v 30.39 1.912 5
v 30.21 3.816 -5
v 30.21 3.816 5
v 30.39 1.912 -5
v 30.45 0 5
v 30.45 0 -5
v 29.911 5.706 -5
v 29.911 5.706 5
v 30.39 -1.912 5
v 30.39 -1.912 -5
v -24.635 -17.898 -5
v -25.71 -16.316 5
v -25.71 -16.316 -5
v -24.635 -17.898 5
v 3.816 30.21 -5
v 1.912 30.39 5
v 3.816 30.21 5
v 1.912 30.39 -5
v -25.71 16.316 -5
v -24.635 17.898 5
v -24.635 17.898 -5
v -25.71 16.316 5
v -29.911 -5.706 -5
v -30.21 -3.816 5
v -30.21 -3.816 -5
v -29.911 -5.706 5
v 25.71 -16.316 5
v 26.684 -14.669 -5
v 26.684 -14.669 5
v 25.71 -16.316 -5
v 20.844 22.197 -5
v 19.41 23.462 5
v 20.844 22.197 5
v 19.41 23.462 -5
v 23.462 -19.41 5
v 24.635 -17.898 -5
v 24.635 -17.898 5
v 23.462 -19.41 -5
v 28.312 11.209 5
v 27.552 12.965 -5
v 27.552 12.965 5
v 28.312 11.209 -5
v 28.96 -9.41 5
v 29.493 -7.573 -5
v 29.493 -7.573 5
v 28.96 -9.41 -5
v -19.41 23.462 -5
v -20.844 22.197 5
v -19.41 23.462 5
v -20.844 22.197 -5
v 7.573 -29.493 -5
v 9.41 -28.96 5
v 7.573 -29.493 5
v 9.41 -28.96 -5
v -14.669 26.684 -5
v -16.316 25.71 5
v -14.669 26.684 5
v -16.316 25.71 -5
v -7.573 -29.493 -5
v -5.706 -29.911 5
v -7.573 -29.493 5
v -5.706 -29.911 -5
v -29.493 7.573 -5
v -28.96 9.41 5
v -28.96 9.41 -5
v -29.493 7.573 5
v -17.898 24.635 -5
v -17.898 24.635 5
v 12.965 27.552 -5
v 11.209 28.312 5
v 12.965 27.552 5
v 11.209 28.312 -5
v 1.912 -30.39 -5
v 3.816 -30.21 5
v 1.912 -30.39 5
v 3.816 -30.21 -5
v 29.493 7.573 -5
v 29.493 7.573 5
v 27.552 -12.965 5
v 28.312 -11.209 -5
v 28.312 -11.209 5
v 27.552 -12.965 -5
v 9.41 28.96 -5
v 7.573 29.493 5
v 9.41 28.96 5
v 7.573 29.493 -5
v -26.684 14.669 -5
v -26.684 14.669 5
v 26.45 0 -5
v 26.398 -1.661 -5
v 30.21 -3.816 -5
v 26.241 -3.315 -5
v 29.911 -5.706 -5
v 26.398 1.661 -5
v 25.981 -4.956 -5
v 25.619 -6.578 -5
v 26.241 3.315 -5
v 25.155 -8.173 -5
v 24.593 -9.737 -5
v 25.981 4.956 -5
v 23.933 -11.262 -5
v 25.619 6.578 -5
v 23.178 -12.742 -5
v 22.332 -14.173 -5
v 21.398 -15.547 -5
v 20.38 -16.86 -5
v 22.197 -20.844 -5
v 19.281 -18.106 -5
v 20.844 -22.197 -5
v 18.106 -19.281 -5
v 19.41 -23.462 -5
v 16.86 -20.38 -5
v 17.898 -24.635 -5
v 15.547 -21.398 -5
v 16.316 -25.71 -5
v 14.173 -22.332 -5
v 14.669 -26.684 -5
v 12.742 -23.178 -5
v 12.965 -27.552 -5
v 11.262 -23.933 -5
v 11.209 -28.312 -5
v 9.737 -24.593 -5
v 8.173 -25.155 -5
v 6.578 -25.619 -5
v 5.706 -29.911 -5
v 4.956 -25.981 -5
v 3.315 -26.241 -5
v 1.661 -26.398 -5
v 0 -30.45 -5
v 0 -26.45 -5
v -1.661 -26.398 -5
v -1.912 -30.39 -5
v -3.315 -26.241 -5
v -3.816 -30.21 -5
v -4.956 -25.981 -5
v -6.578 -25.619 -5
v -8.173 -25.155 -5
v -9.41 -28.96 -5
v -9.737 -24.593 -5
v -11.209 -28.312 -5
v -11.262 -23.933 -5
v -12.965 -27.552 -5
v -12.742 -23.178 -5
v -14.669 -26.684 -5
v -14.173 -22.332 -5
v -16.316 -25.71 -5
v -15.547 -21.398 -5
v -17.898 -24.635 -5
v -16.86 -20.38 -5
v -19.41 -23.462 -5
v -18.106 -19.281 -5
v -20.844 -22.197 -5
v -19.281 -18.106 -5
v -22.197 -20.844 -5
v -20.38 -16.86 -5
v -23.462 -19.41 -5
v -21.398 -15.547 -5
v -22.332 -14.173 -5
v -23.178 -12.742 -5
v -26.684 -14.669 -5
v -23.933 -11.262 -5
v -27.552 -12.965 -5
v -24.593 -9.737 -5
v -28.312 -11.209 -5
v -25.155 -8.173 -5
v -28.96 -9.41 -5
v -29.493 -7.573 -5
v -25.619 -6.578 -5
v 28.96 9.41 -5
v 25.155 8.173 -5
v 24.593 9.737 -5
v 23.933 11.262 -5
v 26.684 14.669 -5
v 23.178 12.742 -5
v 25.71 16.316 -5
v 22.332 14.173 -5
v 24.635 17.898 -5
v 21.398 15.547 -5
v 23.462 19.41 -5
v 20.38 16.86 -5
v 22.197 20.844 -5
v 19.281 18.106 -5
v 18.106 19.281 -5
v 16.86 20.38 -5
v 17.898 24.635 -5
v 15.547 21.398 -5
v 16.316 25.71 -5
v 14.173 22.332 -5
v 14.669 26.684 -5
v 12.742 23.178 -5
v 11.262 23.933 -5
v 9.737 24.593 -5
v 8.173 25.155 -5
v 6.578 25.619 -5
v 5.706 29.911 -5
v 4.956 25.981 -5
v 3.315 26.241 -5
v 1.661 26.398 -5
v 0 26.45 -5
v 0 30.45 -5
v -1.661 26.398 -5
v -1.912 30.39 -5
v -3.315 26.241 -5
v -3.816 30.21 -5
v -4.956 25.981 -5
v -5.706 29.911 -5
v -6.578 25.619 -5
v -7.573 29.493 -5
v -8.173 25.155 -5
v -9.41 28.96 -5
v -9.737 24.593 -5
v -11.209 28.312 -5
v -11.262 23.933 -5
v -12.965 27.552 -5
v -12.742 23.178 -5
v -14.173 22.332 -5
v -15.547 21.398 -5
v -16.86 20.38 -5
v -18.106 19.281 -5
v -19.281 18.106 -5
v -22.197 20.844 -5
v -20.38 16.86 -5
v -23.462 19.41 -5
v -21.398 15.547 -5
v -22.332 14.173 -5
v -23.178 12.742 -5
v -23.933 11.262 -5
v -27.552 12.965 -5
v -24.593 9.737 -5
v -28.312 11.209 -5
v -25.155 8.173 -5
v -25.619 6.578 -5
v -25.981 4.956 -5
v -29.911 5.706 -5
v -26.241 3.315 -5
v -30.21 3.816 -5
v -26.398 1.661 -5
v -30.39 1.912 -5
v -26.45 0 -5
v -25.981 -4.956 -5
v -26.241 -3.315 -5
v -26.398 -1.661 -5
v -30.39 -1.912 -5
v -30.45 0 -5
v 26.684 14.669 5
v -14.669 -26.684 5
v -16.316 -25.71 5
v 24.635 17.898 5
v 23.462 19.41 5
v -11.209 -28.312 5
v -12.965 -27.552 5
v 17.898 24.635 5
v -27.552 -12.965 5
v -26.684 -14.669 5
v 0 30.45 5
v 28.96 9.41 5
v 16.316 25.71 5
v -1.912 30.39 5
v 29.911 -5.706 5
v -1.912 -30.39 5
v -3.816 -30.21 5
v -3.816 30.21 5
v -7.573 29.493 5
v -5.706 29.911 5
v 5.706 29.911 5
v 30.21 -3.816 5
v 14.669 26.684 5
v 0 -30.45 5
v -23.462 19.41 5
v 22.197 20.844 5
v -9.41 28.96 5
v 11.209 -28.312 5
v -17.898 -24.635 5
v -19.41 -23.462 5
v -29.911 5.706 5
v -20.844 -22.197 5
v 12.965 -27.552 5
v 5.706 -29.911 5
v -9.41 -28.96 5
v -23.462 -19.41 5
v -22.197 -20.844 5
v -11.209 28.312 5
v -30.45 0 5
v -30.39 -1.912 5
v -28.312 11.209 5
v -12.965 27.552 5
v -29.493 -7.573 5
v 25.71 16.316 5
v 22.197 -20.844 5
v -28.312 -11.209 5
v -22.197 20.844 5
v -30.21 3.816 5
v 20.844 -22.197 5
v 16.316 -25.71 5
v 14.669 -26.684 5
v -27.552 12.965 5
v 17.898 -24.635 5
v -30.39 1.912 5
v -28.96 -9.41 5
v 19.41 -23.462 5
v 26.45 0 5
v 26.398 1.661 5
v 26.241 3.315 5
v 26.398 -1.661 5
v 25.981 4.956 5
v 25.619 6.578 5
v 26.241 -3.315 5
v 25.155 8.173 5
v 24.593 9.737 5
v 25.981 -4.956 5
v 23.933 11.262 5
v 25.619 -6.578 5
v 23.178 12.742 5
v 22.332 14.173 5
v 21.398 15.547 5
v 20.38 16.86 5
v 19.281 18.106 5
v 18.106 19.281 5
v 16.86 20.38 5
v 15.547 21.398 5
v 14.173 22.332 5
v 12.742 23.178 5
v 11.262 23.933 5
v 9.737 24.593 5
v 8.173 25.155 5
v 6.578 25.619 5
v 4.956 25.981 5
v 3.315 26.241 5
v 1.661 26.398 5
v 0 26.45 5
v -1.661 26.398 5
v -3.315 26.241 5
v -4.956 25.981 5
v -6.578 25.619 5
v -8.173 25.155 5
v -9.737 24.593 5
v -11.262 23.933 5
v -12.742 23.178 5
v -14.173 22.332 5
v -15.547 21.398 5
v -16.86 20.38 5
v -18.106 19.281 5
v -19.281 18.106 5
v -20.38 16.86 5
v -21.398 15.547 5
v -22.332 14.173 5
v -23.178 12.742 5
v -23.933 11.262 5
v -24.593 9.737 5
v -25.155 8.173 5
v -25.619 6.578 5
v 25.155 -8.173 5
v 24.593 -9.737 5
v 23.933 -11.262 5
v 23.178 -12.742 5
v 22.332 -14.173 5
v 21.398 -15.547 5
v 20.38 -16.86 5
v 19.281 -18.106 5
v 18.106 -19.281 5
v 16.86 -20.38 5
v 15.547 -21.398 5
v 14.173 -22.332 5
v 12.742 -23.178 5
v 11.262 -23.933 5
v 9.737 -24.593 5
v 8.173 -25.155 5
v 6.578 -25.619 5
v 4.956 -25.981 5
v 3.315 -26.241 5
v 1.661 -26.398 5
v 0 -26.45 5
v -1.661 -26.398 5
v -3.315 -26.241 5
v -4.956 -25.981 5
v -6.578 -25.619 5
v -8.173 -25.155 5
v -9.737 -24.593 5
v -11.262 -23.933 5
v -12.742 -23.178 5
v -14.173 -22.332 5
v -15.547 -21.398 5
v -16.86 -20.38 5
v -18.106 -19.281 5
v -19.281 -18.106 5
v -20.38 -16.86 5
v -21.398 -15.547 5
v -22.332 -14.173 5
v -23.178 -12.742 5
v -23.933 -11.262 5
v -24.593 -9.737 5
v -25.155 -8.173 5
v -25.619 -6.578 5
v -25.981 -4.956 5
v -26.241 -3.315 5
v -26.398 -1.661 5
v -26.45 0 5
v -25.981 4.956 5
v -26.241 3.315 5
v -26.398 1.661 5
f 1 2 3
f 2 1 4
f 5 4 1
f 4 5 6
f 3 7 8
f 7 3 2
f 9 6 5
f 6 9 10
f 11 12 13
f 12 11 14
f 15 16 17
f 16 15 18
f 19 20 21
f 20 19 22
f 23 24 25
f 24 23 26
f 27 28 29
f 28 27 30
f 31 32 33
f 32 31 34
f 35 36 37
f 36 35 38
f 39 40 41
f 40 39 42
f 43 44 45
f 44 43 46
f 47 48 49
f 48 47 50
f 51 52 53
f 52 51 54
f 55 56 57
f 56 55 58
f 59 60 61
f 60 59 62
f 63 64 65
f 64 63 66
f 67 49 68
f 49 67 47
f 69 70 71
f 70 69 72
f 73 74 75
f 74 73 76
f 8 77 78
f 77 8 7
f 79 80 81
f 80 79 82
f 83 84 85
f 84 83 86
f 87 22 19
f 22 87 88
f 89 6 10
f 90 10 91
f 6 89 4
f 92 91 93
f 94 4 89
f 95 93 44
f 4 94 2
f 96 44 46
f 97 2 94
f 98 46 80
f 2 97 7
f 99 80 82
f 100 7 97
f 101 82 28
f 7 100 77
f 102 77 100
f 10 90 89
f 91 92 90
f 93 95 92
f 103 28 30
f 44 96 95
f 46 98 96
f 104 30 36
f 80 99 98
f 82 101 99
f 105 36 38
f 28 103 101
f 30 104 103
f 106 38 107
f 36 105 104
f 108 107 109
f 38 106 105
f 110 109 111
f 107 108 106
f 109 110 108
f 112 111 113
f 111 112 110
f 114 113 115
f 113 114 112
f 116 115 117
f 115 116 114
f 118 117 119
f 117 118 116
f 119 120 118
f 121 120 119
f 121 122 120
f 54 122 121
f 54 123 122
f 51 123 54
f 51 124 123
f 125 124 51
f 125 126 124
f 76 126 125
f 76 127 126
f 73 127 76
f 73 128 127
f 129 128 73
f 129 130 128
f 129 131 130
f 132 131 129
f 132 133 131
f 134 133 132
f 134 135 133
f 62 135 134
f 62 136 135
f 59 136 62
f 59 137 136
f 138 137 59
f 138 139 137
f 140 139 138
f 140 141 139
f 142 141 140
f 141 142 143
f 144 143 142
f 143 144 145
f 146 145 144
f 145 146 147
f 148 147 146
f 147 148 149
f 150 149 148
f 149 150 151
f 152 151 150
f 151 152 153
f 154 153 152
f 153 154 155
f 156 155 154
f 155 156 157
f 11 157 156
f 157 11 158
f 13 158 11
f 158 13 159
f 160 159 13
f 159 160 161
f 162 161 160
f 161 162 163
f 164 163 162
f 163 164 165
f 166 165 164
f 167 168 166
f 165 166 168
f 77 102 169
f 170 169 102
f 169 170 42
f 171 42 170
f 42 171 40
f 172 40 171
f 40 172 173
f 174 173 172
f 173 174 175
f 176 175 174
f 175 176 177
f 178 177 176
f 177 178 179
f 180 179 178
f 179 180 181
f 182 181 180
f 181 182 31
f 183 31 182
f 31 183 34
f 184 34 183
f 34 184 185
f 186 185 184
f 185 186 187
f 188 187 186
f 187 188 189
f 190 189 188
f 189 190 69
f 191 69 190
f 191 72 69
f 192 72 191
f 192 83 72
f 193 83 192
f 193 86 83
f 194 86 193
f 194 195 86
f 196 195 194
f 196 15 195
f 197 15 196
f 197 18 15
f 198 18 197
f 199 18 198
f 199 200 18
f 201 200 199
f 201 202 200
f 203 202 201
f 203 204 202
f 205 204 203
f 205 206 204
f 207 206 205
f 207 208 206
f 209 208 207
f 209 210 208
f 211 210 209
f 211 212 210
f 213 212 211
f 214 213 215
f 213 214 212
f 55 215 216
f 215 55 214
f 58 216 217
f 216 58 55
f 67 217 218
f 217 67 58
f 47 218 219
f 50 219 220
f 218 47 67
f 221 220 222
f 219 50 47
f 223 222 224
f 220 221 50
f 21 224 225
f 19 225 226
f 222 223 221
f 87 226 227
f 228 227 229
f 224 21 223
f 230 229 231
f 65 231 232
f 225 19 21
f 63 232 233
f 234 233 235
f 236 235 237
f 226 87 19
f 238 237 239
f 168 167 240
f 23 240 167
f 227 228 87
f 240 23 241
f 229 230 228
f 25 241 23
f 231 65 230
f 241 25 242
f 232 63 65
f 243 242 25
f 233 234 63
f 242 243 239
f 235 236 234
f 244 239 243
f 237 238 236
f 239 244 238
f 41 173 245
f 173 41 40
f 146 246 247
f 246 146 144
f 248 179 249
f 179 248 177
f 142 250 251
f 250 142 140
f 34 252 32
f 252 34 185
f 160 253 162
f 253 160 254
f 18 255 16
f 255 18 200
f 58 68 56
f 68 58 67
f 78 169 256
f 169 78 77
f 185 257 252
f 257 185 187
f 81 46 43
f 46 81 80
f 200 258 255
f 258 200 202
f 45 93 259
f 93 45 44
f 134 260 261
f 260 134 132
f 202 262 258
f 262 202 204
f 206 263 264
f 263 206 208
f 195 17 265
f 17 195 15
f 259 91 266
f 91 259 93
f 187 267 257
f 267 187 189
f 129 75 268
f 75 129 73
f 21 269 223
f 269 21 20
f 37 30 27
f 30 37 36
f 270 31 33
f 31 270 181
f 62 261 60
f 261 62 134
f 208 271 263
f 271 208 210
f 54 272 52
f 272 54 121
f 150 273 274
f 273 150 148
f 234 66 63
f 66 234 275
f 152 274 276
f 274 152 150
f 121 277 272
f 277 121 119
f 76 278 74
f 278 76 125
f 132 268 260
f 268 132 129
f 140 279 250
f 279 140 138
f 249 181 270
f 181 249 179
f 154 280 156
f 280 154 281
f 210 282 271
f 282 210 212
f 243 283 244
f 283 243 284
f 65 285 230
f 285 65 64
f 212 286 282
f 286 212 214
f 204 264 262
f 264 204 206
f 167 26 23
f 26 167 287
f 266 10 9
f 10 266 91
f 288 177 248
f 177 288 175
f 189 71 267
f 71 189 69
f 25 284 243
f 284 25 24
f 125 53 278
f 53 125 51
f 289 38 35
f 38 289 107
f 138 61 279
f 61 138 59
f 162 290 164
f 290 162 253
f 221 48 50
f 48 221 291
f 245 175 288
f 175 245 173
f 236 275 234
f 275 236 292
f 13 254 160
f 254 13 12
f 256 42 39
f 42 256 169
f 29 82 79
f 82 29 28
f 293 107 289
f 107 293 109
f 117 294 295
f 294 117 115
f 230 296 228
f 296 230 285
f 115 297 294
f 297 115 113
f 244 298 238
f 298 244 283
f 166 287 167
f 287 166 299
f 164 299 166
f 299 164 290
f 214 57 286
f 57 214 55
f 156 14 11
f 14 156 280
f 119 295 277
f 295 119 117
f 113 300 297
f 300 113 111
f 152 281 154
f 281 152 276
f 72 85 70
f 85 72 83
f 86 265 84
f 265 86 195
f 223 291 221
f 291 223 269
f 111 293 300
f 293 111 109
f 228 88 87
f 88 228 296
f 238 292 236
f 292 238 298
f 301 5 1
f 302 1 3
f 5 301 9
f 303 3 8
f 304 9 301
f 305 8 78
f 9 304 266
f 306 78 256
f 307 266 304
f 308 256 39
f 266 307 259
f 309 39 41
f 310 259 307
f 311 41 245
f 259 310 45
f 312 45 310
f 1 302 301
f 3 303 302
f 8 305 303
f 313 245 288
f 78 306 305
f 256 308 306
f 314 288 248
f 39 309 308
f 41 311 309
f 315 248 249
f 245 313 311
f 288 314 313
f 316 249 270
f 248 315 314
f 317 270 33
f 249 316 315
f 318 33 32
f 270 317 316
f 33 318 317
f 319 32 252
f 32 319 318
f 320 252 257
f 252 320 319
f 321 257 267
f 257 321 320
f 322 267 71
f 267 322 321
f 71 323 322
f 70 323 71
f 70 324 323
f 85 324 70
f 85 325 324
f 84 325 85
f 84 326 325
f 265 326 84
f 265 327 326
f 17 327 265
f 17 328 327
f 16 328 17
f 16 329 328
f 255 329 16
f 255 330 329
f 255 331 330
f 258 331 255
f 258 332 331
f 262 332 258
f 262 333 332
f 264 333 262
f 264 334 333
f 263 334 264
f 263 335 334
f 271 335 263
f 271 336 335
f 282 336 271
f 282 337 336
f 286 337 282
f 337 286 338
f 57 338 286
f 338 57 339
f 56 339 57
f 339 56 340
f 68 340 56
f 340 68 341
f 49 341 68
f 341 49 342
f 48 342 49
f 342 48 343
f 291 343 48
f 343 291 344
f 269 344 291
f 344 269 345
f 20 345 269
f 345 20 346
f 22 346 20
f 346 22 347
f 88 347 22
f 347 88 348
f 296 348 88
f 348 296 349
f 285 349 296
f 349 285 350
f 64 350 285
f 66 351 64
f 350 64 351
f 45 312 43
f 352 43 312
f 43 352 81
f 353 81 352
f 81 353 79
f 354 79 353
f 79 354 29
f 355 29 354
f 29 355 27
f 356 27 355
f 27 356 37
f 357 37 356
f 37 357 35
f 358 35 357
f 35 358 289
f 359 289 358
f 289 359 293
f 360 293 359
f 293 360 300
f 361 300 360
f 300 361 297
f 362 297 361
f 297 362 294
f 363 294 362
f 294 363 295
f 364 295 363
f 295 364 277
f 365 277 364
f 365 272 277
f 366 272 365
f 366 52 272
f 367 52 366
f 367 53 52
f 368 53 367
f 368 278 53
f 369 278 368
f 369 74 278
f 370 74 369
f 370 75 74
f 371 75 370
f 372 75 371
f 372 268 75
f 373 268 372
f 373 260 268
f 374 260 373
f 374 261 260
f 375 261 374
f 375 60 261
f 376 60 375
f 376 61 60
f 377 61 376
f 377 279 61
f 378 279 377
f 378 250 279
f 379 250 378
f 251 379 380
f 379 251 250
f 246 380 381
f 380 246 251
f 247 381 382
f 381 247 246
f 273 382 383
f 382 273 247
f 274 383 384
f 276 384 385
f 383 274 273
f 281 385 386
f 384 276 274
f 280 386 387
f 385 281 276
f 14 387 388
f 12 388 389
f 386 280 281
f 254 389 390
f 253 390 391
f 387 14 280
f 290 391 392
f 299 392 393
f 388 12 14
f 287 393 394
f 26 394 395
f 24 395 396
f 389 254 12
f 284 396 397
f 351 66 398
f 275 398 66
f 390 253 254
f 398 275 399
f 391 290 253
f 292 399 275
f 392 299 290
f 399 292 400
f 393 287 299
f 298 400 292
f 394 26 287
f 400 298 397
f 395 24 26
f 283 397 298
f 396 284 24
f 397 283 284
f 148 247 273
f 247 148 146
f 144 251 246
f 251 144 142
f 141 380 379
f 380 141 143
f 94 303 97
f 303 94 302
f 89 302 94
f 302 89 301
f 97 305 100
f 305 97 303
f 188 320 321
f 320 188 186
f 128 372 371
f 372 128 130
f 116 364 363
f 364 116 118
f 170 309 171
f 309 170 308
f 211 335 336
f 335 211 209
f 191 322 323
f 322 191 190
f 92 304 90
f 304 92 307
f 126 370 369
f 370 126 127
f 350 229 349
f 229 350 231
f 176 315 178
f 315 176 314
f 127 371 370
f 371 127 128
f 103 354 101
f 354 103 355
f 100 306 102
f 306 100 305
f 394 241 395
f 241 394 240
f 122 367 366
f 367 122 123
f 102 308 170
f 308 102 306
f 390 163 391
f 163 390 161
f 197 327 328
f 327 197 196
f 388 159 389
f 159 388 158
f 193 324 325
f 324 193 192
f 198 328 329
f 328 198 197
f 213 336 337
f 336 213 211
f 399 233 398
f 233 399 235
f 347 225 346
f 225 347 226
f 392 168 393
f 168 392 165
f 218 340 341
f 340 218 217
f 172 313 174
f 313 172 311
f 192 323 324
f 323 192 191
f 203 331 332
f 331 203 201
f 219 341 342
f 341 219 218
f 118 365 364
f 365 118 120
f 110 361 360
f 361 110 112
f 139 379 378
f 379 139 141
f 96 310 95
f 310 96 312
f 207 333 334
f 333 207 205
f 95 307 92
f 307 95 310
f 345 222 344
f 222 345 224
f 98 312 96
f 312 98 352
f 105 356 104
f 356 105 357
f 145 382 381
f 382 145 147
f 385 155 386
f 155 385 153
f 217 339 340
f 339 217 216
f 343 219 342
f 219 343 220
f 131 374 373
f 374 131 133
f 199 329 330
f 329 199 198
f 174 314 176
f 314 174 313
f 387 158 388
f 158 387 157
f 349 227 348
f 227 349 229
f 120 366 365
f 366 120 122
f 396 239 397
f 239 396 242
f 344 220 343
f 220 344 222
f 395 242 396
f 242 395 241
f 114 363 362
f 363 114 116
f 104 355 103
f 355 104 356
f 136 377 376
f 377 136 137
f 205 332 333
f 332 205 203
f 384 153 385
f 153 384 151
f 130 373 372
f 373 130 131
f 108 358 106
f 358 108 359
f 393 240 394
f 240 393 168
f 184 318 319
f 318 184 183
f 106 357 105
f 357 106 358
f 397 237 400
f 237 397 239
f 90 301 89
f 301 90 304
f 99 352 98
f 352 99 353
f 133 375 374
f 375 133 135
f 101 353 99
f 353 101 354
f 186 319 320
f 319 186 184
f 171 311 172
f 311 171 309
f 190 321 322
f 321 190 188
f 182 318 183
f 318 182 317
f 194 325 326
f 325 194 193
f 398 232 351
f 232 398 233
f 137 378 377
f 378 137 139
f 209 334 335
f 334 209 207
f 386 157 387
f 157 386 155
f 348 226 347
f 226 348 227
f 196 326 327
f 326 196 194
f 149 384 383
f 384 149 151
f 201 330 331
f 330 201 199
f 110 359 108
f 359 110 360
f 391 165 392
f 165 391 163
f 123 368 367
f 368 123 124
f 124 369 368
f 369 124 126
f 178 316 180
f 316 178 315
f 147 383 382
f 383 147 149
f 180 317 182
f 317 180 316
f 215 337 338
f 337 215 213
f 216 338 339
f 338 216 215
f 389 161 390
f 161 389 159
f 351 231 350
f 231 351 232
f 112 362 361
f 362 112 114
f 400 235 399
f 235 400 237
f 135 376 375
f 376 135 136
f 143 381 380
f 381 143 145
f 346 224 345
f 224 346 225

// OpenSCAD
// --- Test Ring Variables ---
// Copied from your main file to ensure accuracy
tube_diameter = 52.9; // The inner diameter
wall_thickness = 4;    // The wall thickness
test_length = 10;      // The length of the test piece

// --- Calculations ---
tube_radius = tube_diameter / 2;
outer_radius = tube_radius + wall_thickness;

$fn=100; // For a smooth circle

// --- Create the Test Ring ---
// We'll create a solid outer ring and subtract the inner hole.
difference() {
    // 1. Outer solid cylinder
    cylinder(h = test_length, r = outer_radius, center = true);
    
    // 2. Inner cutout
    // We make the cutout slightly taller to ensure a clean boolean operation
    cylinder(h = test_length + 2, r = tube_radius, center = true);
}
